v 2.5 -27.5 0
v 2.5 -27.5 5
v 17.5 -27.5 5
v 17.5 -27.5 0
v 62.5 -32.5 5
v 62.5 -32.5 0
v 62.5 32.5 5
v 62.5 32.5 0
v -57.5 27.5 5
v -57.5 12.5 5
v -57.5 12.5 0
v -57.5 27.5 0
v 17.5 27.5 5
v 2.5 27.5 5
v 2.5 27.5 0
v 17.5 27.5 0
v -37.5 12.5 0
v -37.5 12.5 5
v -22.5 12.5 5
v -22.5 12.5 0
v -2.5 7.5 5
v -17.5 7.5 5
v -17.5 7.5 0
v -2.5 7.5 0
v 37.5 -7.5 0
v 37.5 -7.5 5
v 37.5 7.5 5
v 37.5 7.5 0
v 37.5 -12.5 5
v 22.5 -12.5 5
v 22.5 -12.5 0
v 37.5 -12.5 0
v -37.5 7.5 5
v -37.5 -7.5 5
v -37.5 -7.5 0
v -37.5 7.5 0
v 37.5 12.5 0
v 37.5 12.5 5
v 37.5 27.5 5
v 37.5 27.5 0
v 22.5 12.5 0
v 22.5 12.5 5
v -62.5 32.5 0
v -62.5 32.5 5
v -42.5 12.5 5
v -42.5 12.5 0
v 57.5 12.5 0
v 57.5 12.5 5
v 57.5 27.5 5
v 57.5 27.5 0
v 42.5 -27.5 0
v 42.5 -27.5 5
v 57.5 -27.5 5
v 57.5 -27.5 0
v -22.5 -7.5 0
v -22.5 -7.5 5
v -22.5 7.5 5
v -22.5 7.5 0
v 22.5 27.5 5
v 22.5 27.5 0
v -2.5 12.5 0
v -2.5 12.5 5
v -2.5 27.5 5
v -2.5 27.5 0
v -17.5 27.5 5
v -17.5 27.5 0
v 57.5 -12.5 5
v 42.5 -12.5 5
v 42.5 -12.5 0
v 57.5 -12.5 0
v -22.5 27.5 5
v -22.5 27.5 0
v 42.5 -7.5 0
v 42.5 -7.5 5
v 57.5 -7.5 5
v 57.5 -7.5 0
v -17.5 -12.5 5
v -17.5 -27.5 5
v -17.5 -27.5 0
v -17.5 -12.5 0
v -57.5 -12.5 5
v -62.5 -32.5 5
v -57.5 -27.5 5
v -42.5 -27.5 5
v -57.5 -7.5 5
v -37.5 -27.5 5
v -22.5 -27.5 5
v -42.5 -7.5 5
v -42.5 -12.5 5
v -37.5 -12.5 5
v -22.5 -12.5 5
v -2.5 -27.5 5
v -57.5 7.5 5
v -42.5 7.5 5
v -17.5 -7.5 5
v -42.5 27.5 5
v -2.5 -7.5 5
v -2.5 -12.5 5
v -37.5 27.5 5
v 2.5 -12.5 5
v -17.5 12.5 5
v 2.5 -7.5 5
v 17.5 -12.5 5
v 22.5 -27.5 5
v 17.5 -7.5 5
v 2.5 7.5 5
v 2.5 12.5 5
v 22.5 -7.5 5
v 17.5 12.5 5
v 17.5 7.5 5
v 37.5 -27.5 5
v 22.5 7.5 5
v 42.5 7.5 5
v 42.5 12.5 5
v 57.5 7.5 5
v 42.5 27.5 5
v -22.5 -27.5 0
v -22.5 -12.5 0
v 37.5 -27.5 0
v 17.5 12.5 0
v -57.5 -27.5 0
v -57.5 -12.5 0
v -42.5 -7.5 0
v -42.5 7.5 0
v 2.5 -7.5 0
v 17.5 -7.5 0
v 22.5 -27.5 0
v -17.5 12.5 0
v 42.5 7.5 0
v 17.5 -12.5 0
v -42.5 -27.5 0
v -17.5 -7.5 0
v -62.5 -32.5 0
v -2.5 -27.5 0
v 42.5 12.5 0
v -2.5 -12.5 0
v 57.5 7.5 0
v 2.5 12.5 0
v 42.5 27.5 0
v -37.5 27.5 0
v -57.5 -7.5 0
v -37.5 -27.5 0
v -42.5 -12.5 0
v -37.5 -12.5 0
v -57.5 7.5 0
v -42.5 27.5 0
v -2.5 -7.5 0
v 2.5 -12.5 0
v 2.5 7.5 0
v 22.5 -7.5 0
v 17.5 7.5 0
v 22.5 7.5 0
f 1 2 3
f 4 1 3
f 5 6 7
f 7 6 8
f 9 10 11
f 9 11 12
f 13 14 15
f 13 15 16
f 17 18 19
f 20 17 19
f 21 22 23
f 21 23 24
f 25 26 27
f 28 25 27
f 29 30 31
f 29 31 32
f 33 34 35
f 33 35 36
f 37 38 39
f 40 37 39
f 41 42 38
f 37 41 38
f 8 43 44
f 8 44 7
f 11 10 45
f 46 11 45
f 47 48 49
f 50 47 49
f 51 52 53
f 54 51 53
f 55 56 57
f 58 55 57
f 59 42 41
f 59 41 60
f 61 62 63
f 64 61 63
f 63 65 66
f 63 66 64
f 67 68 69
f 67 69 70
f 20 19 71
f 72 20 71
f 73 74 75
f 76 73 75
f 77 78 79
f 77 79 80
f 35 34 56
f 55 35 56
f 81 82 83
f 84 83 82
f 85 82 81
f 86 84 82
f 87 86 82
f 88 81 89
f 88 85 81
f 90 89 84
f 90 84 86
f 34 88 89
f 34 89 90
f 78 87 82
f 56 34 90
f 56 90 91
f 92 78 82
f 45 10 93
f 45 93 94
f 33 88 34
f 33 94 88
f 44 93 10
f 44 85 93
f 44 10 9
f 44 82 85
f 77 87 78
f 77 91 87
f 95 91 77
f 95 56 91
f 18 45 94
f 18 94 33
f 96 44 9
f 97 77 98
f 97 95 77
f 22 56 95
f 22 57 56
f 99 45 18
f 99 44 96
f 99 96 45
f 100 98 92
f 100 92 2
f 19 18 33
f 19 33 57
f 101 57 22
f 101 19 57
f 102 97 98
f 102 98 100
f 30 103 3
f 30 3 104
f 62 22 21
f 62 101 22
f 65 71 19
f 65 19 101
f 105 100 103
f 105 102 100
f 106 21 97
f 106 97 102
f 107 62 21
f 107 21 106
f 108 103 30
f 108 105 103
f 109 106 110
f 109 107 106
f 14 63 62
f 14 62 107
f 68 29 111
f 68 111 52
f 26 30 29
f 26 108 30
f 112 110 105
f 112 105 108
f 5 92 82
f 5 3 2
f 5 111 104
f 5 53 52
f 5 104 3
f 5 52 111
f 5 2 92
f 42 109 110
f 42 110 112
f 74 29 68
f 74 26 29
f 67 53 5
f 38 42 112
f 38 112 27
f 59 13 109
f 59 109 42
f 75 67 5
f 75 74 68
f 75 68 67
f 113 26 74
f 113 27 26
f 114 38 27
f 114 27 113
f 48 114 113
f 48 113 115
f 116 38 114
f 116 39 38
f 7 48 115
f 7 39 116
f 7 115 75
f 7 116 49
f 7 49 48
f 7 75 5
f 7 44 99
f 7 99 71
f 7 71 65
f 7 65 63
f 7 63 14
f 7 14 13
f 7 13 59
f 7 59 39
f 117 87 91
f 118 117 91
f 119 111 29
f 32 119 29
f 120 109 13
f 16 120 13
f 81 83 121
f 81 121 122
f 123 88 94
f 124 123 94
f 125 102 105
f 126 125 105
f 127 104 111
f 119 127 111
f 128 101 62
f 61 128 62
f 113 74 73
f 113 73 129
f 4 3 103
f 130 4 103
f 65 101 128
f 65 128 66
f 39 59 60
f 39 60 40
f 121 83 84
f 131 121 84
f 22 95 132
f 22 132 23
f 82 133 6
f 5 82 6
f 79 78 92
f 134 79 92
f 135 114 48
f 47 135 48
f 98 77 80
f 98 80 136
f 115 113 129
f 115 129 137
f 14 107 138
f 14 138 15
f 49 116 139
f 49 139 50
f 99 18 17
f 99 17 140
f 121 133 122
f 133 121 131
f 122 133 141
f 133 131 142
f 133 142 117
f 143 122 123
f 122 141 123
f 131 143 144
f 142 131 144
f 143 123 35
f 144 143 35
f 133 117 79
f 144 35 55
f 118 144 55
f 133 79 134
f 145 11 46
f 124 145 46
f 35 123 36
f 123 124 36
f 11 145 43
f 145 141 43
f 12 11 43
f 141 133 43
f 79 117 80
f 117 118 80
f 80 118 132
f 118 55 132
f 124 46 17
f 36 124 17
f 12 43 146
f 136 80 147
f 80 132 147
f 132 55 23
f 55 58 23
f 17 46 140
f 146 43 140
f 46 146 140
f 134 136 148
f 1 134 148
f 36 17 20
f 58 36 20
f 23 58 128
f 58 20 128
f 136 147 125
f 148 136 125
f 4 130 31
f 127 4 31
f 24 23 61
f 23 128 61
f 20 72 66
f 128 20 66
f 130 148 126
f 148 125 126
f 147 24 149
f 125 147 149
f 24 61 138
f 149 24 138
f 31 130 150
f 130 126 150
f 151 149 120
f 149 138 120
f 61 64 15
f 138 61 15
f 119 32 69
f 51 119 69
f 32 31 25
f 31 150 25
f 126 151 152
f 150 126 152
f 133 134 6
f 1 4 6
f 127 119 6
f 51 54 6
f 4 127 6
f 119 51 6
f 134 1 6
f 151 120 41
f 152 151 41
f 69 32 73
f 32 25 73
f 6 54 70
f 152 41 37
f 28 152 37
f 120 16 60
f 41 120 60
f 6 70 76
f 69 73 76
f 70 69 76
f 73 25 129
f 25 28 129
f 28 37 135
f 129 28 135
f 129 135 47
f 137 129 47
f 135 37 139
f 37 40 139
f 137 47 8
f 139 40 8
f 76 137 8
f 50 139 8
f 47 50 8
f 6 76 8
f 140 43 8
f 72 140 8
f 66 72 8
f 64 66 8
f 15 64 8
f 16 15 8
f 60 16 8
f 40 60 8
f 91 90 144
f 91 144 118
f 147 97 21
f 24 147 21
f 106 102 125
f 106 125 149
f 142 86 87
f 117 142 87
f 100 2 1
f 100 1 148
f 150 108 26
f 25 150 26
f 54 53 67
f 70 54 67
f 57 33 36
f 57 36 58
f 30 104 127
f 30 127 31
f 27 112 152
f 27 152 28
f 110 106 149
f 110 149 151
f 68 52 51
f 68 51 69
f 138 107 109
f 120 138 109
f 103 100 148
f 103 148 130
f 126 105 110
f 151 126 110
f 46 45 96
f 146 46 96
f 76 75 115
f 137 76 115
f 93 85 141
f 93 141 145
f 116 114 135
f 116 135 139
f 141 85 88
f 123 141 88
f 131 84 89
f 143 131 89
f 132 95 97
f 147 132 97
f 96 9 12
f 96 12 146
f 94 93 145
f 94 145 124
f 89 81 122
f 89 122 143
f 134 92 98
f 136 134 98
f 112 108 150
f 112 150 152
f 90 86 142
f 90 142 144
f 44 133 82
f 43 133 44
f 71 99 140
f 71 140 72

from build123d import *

# Parameters (mm, degrees)
SKETCH_1_W                  = 125
SKETCH_1_H                  = 65
EXTRUDE_1_DEPTH             = 5
SKETCH_2_W                  = 15
SKETCH_2_H                  = 15
CUT_EXTRUDE_1_DEPTH         = 5
PATTERN_LINEAR_1_COUNT      = 6
PATTERN_LINEAR_1_PITCH      = 20
PATTERN_LINEAR_1_COUNT_DIR2 = 3
PATTERN_LINEAR_1_PITCH_DIR2 = 20


with BuildPart() as part:
    # 草图1 → 凸台-拉伸1 (new body)
    with BuildSketch(Plane.XY):
        Rectangle(SKETCH_1_W, SKETCH_1_H)
    extrude(amount=EXTRUDE_1_DEPTH)

    # 草图2 → 切除-拉伸1 (cut)
    with BuildSketch(Plane.XY.offset(5)):
        with Locations((-50, 20)):
            Rectangle(SKETCH_2_W, SKETCH_2_H)
    cut_extrude_1 = extrude(amount=-CUT_EXTRUDE_1_DEPTH, mode=Mode.SUBTRACT)

    # 阵列(线性)1: Cut-Extrude 1 6 × 3
    with Locations(*[(i * PATTERN_LINEAR_1_PITCH, -j * PATTERN_LINEAR_1_PITCH_DIR2, 0) for i in range(PATTERN_LINEAR_1_COUNT) for j in range(PATTERN_LINEAR_1_COUNT_DIR2) if (i, j) != (0, 0)]):
        add(cut_extrude_1, mode=Mode.SUBTRACT)


solid = part.part
